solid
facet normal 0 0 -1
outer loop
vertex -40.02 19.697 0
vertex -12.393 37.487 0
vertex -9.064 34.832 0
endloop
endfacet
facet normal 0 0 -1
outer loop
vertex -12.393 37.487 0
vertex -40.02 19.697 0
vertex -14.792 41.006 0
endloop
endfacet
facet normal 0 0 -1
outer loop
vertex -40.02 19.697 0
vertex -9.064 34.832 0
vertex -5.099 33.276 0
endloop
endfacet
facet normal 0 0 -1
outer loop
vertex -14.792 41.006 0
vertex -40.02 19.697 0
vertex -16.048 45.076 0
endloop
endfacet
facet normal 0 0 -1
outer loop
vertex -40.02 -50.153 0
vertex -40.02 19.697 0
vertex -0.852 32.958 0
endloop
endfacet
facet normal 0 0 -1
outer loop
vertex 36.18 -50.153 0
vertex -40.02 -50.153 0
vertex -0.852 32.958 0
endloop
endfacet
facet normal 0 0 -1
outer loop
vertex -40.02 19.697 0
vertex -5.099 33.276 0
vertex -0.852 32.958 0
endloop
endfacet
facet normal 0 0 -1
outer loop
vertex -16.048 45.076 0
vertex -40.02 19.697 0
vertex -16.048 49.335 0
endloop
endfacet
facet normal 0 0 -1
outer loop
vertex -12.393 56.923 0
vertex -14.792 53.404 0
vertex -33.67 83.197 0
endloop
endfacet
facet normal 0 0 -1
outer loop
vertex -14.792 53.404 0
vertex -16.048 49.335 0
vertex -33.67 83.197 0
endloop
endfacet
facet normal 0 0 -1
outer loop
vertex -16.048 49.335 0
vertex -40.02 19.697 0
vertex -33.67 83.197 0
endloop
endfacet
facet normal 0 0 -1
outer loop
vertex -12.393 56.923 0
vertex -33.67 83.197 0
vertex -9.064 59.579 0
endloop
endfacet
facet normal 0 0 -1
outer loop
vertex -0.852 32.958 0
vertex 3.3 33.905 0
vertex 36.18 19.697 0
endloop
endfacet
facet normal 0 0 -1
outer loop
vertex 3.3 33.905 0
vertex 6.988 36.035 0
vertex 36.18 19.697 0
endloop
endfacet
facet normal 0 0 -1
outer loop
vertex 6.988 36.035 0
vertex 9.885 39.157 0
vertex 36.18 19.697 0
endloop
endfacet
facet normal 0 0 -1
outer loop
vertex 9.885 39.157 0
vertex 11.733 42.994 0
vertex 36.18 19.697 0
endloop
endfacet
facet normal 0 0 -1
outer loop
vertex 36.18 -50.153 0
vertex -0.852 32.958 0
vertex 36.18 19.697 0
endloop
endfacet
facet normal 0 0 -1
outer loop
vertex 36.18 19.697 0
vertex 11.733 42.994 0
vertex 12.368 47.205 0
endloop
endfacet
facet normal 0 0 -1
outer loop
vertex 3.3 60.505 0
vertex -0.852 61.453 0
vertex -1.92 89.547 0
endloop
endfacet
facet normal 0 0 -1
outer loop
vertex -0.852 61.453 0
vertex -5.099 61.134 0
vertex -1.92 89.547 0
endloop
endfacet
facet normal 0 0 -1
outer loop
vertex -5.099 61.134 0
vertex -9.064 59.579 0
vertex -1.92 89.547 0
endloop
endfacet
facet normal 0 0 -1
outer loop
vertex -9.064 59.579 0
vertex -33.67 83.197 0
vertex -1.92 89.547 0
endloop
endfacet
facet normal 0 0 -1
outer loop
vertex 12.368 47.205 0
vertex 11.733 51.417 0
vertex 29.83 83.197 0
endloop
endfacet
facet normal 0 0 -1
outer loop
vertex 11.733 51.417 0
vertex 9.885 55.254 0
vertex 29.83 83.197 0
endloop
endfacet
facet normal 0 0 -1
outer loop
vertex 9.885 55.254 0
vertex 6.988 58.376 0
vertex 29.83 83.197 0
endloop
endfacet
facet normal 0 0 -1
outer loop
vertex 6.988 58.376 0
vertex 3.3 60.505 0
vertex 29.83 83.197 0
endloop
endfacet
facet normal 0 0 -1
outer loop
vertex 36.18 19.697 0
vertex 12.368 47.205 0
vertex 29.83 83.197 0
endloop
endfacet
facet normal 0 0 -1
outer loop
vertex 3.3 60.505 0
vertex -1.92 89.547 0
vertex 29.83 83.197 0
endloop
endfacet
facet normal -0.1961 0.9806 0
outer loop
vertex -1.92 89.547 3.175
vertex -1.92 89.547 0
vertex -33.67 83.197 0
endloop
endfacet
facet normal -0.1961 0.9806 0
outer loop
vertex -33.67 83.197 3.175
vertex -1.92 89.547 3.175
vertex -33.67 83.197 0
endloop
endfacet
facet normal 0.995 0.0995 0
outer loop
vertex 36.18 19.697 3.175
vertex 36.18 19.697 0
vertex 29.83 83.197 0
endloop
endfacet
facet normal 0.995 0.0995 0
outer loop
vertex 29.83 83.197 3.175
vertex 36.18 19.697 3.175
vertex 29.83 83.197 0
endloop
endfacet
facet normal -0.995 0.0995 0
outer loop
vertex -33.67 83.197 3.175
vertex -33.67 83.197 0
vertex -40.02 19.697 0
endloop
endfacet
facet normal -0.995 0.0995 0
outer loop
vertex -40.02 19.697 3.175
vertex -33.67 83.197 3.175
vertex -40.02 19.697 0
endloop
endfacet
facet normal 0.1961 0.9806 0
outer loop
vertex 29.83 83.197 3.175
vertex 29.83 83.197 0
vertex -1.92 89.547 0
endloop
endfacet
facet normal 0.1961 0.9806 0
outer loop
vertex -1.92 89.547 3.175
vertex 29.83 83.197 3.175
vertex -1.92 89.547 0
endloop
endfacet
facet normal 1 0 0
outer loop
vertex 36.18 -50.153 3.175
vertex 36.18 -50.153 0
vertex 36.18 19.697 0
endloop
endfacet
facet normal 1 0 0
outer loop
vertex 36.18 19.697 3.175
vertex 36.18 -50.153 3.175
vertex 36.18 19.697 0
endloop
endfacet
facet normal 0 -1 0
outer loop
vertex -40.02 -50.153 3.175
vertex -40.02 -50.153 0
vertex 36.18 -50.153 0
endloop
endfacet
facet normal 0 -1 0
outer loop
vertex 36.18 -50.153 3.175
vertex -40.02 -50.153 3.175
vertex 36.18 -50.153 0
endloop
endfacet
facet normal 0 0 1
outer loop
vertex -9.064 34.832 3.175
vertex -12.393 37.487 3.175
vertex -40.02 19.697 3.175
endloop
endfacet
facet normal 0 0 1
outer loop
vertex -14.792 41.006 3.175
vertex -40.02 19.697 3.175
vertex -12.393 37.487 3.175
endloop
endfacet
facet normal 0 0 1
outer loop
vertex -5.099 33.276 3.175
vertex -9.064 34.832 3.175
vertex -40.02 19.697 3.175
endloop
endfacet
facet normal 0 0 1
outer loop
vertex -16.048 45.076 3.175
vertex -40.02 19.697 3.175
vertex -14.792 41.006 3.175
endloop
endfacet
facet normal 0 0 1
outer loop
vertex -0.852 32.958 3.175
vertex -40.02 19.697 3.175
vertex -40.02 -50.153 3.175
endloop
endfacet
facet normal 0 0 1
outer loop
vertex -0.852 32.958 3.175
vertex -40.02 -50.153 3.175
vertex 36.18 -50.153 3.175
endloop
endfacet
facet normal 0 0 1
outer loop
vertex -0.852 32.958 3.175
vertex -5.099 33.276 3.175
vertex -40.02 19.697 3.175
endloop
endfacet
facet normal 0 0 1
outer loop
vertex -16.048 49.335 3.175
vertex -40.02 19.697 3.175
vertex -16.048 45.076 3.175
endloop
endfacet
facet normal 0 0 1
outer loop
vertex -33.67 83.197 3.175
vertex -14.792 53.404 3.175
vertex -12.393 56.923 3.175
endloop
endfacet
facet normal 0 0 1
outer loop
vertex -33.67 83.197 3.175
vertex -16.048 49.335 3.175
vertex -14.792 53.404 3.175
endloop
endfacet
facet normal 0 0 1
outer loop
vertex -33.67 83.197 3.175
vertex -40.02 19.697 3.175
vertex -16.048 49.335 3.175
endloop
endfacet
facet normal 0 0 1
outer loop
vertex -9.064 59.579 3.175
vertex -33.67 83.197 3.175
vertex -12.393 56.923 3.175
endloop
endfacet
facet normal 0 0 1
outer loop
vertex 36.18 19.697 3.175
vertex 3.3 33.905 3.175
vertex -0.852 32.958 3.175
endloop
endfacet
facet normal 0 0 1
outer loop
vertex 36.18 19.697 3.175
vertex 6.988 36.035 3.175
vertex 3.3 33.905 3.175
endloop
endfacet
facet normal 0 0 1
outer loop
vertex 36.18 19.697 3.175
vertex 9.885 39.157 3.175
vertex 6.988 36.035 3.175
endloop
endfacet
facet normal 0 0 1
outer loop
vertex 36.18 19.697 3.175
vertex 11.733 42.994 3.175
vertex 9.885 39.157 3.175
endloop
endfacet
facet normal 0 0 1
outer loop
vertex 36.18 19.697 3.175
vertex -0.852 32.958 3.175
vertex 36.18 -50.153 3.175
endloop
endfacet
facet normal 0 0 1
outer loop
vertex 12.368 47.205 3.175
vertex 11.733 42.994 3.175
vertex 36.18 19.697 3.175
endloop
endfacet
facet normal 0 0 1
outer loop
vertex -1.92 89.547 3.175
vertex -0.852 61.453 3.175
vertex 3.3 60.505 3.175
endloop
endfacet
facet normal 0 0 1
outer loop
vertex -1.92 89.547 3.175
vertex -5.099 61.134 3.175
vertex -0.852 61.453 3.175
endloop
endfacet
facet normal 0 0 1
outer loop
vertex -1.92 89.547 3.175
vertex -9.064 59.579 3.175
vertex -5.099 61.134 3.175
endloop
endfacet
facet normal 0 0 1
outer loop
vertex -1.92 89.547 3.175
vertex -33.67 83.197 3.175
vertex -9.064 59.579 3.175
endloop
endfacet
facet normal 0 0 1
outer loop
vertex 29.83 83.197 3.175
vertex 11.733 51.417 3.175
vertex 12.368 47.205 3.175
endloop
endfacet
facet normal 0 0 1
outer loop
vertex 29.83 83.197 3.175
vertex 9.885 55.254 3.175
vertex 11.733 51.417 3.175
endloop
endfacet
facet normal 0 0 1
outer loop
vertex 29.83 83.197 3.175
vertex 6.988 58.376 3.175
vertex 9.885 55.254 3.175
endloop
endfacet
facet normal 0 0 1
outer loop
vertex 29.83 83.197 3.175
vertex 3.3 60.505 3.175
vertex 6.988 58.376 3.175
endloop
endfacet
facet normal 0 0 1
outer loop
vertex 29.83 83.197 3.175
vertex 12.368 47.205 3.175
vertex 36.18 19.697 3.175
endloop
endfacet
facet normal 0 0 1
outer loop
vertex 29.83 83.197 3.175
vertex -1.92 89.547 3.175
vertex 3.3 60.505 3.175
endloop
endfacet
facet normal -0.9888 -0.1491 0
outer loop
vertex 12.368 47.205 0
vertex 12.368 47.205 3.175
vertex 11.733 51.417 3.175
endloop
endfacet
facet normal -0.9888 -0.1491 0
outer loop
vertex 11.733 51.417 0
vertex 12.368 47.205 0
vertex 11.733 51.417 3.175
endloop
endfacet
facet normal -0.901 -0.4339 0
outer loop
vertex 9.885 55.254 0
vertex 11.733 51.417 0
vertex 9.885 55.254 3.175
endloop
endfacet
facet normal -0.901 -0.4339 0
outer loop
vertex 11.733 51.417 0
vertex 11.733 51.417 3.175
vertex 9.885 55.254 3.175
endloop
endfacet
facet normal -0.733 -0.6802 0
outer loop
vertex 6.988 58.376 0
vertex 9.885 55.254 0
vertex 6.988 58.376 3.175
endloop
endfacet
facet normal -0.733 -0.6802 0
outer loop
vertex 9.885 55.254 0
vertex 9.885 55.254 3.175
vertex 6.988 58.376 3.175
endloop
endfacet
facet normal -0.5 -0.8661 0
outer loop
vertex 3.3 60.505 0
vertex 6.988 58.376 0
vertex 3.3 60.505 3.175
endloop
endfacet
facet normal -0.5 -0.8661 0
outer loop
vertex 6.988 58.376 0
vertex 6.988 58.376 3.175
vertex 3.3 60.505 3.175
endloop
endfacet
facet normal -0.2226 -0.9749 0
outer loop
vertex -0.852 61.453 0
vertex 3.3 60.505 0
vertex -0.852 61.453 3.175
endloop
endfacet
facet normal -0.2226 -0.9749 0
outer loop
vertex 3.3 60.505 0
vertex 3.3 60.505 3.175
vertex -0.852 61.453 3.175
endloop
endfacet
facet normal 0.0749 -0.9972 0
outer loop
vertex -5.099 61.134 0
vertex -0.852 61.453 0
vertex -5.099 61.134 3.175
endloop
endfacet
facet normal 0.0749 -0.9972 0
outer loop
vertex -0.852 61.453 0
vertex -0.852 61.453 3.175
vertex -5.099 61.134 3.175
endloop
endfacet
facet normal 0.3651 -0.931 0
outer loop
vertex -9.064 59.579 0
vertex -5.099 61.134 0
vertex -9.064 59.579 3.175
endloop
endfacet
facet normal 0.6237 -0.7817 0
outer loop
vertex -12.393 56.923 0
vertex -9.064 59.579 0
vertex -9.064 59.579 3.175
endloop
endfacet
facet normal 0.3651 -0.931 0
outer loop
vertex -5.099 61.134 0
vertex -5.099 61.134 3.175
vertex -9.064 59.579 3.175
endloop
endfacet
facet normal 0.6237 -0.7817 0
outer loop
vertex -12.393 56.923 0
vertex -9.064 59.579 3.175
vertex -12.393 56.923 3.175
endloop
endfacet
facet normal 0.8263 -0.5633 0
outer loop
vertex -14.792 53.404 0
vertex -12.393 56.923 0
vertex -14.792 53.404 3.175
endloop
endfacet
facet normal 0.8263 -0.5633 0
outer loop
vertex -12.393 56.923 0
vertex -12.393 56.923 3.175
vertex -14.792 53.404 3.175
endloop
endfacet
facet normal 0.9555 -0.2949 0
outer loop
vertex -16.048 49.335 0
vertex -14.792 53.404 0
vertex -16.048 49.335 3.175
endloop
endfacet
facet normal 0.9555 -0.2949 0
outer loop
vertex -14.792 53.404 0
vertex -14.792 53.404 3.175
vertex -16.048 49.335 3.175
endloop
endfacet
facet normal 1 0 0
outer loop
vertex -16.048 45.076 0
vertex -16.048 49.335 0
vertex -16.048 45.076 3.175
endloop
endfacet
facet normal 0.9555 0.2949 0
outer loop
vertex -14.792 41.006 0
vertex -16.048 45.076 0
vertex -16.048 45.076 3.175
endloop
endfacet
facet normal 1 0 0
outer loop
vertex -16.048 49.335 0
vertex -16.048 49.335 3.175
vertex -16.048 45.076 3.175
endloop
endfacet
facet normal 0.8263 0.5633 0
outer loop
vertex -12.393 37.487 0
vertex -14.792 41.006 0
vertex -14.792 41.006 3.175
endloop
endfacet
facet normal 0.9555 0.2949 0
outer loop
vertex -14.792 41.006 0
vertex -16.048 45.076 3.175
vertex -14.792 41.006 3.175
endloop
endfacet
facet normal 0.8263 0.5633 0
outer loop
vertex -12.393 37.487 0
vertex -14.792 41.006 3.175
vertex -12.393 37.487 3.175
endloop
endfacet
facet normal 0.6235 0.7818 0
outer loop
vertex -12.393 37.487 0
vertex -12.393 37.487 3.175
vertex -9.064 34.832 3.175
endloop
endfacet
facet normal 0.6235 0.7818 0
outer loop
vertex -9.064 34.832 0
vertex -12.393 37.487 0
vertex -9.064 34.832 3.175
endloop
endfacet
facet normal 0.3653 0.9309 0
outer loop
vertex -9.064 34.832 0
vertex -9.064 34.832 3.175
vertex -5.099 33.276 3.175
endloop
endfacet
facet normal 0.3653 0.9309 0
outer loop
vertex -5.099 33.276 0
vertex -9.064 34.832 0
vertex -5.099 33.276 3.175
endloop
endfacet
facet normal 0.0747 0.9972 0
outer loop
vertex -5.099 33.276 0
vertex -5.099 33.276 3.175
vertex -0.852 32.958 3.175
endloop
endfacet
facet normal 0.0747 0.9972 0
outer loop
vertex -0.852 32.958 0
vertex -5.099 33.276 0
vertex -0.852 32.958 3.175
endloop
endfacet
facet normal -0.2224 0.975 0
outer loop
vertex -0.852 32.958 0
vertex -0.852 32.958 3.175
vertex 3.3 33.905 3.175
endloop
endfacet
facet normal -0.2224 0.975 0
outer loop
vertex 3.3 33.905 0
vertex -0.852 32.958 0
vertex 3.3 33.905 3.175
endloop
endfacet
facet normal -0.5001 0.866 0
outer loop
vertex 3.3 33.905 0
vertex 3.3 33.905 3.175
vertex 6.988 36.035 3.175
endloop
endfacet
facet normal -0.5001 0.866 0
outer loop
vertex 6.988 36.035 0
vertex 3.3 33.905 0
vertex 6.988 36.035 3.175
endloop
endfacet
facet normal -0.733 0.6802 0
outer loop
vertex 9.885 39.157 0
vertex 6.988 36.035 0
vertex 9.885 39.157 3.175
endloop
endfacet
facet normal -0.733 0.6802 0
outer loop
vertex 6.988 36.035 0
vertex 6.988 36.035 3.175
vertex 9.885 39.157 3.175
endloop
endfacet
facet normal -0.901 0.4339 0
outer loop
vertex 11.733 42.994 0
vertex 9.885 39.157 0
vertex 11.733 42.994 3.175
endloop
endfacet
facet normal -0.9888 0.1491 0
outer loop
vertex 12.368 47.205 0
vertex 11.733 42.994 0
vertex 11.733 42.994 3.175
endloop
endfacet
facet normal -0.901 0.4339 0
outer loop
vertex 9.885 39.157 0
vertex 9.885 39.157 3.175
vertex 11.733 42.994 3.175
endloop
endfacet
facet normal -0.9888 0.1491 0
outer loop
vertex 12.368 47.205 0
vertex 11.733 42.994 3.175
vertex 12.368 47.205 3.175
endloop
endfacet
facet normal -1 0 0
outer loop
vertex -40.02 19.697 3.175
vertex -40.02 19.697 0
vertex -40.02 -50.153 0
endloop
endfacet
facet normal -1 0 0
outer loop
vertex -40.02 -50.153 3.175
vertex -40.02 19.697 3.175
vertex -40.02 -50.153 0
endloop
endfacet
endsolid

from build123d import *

# Parameters (mm, degrees)
BOSS_EXTRUDE1_DEPTH = 3.175
SKETCH2_R           = 14.2875
CUT_EXTRUDE1_DEPTH  = 3.175


with BuildPart() as part:
    # Sketch1 → Boss-Extrude1 (new body)
    with BuildSketch(Plane.XY):
        Polygon((36.180133555, -50.152996979), (36.180133555, 19.697003021), (29.830133555, 83.197003021), (-1.919866445, 89.547003021), (-33.669866445, 83.197003021), (-40.019866445, 19.697003021), (-40.019866445, -50.152996979), align=None)
    extrude(amount=BOSS_EXTRUDE1_DEPTH)

    # Sketch2 → Cut-Extrude1 (cut)
    with BuildSketch(Plane.XY.offset(3.175)):
        with Locations((-1.919866445, 47.205203021)):
            Circle(SKETCH2_R)
    extrude(amount=-CUT_EXTRUDE1_DEPTH, mode=Mode.SUBTRACT)


solid = part.part
